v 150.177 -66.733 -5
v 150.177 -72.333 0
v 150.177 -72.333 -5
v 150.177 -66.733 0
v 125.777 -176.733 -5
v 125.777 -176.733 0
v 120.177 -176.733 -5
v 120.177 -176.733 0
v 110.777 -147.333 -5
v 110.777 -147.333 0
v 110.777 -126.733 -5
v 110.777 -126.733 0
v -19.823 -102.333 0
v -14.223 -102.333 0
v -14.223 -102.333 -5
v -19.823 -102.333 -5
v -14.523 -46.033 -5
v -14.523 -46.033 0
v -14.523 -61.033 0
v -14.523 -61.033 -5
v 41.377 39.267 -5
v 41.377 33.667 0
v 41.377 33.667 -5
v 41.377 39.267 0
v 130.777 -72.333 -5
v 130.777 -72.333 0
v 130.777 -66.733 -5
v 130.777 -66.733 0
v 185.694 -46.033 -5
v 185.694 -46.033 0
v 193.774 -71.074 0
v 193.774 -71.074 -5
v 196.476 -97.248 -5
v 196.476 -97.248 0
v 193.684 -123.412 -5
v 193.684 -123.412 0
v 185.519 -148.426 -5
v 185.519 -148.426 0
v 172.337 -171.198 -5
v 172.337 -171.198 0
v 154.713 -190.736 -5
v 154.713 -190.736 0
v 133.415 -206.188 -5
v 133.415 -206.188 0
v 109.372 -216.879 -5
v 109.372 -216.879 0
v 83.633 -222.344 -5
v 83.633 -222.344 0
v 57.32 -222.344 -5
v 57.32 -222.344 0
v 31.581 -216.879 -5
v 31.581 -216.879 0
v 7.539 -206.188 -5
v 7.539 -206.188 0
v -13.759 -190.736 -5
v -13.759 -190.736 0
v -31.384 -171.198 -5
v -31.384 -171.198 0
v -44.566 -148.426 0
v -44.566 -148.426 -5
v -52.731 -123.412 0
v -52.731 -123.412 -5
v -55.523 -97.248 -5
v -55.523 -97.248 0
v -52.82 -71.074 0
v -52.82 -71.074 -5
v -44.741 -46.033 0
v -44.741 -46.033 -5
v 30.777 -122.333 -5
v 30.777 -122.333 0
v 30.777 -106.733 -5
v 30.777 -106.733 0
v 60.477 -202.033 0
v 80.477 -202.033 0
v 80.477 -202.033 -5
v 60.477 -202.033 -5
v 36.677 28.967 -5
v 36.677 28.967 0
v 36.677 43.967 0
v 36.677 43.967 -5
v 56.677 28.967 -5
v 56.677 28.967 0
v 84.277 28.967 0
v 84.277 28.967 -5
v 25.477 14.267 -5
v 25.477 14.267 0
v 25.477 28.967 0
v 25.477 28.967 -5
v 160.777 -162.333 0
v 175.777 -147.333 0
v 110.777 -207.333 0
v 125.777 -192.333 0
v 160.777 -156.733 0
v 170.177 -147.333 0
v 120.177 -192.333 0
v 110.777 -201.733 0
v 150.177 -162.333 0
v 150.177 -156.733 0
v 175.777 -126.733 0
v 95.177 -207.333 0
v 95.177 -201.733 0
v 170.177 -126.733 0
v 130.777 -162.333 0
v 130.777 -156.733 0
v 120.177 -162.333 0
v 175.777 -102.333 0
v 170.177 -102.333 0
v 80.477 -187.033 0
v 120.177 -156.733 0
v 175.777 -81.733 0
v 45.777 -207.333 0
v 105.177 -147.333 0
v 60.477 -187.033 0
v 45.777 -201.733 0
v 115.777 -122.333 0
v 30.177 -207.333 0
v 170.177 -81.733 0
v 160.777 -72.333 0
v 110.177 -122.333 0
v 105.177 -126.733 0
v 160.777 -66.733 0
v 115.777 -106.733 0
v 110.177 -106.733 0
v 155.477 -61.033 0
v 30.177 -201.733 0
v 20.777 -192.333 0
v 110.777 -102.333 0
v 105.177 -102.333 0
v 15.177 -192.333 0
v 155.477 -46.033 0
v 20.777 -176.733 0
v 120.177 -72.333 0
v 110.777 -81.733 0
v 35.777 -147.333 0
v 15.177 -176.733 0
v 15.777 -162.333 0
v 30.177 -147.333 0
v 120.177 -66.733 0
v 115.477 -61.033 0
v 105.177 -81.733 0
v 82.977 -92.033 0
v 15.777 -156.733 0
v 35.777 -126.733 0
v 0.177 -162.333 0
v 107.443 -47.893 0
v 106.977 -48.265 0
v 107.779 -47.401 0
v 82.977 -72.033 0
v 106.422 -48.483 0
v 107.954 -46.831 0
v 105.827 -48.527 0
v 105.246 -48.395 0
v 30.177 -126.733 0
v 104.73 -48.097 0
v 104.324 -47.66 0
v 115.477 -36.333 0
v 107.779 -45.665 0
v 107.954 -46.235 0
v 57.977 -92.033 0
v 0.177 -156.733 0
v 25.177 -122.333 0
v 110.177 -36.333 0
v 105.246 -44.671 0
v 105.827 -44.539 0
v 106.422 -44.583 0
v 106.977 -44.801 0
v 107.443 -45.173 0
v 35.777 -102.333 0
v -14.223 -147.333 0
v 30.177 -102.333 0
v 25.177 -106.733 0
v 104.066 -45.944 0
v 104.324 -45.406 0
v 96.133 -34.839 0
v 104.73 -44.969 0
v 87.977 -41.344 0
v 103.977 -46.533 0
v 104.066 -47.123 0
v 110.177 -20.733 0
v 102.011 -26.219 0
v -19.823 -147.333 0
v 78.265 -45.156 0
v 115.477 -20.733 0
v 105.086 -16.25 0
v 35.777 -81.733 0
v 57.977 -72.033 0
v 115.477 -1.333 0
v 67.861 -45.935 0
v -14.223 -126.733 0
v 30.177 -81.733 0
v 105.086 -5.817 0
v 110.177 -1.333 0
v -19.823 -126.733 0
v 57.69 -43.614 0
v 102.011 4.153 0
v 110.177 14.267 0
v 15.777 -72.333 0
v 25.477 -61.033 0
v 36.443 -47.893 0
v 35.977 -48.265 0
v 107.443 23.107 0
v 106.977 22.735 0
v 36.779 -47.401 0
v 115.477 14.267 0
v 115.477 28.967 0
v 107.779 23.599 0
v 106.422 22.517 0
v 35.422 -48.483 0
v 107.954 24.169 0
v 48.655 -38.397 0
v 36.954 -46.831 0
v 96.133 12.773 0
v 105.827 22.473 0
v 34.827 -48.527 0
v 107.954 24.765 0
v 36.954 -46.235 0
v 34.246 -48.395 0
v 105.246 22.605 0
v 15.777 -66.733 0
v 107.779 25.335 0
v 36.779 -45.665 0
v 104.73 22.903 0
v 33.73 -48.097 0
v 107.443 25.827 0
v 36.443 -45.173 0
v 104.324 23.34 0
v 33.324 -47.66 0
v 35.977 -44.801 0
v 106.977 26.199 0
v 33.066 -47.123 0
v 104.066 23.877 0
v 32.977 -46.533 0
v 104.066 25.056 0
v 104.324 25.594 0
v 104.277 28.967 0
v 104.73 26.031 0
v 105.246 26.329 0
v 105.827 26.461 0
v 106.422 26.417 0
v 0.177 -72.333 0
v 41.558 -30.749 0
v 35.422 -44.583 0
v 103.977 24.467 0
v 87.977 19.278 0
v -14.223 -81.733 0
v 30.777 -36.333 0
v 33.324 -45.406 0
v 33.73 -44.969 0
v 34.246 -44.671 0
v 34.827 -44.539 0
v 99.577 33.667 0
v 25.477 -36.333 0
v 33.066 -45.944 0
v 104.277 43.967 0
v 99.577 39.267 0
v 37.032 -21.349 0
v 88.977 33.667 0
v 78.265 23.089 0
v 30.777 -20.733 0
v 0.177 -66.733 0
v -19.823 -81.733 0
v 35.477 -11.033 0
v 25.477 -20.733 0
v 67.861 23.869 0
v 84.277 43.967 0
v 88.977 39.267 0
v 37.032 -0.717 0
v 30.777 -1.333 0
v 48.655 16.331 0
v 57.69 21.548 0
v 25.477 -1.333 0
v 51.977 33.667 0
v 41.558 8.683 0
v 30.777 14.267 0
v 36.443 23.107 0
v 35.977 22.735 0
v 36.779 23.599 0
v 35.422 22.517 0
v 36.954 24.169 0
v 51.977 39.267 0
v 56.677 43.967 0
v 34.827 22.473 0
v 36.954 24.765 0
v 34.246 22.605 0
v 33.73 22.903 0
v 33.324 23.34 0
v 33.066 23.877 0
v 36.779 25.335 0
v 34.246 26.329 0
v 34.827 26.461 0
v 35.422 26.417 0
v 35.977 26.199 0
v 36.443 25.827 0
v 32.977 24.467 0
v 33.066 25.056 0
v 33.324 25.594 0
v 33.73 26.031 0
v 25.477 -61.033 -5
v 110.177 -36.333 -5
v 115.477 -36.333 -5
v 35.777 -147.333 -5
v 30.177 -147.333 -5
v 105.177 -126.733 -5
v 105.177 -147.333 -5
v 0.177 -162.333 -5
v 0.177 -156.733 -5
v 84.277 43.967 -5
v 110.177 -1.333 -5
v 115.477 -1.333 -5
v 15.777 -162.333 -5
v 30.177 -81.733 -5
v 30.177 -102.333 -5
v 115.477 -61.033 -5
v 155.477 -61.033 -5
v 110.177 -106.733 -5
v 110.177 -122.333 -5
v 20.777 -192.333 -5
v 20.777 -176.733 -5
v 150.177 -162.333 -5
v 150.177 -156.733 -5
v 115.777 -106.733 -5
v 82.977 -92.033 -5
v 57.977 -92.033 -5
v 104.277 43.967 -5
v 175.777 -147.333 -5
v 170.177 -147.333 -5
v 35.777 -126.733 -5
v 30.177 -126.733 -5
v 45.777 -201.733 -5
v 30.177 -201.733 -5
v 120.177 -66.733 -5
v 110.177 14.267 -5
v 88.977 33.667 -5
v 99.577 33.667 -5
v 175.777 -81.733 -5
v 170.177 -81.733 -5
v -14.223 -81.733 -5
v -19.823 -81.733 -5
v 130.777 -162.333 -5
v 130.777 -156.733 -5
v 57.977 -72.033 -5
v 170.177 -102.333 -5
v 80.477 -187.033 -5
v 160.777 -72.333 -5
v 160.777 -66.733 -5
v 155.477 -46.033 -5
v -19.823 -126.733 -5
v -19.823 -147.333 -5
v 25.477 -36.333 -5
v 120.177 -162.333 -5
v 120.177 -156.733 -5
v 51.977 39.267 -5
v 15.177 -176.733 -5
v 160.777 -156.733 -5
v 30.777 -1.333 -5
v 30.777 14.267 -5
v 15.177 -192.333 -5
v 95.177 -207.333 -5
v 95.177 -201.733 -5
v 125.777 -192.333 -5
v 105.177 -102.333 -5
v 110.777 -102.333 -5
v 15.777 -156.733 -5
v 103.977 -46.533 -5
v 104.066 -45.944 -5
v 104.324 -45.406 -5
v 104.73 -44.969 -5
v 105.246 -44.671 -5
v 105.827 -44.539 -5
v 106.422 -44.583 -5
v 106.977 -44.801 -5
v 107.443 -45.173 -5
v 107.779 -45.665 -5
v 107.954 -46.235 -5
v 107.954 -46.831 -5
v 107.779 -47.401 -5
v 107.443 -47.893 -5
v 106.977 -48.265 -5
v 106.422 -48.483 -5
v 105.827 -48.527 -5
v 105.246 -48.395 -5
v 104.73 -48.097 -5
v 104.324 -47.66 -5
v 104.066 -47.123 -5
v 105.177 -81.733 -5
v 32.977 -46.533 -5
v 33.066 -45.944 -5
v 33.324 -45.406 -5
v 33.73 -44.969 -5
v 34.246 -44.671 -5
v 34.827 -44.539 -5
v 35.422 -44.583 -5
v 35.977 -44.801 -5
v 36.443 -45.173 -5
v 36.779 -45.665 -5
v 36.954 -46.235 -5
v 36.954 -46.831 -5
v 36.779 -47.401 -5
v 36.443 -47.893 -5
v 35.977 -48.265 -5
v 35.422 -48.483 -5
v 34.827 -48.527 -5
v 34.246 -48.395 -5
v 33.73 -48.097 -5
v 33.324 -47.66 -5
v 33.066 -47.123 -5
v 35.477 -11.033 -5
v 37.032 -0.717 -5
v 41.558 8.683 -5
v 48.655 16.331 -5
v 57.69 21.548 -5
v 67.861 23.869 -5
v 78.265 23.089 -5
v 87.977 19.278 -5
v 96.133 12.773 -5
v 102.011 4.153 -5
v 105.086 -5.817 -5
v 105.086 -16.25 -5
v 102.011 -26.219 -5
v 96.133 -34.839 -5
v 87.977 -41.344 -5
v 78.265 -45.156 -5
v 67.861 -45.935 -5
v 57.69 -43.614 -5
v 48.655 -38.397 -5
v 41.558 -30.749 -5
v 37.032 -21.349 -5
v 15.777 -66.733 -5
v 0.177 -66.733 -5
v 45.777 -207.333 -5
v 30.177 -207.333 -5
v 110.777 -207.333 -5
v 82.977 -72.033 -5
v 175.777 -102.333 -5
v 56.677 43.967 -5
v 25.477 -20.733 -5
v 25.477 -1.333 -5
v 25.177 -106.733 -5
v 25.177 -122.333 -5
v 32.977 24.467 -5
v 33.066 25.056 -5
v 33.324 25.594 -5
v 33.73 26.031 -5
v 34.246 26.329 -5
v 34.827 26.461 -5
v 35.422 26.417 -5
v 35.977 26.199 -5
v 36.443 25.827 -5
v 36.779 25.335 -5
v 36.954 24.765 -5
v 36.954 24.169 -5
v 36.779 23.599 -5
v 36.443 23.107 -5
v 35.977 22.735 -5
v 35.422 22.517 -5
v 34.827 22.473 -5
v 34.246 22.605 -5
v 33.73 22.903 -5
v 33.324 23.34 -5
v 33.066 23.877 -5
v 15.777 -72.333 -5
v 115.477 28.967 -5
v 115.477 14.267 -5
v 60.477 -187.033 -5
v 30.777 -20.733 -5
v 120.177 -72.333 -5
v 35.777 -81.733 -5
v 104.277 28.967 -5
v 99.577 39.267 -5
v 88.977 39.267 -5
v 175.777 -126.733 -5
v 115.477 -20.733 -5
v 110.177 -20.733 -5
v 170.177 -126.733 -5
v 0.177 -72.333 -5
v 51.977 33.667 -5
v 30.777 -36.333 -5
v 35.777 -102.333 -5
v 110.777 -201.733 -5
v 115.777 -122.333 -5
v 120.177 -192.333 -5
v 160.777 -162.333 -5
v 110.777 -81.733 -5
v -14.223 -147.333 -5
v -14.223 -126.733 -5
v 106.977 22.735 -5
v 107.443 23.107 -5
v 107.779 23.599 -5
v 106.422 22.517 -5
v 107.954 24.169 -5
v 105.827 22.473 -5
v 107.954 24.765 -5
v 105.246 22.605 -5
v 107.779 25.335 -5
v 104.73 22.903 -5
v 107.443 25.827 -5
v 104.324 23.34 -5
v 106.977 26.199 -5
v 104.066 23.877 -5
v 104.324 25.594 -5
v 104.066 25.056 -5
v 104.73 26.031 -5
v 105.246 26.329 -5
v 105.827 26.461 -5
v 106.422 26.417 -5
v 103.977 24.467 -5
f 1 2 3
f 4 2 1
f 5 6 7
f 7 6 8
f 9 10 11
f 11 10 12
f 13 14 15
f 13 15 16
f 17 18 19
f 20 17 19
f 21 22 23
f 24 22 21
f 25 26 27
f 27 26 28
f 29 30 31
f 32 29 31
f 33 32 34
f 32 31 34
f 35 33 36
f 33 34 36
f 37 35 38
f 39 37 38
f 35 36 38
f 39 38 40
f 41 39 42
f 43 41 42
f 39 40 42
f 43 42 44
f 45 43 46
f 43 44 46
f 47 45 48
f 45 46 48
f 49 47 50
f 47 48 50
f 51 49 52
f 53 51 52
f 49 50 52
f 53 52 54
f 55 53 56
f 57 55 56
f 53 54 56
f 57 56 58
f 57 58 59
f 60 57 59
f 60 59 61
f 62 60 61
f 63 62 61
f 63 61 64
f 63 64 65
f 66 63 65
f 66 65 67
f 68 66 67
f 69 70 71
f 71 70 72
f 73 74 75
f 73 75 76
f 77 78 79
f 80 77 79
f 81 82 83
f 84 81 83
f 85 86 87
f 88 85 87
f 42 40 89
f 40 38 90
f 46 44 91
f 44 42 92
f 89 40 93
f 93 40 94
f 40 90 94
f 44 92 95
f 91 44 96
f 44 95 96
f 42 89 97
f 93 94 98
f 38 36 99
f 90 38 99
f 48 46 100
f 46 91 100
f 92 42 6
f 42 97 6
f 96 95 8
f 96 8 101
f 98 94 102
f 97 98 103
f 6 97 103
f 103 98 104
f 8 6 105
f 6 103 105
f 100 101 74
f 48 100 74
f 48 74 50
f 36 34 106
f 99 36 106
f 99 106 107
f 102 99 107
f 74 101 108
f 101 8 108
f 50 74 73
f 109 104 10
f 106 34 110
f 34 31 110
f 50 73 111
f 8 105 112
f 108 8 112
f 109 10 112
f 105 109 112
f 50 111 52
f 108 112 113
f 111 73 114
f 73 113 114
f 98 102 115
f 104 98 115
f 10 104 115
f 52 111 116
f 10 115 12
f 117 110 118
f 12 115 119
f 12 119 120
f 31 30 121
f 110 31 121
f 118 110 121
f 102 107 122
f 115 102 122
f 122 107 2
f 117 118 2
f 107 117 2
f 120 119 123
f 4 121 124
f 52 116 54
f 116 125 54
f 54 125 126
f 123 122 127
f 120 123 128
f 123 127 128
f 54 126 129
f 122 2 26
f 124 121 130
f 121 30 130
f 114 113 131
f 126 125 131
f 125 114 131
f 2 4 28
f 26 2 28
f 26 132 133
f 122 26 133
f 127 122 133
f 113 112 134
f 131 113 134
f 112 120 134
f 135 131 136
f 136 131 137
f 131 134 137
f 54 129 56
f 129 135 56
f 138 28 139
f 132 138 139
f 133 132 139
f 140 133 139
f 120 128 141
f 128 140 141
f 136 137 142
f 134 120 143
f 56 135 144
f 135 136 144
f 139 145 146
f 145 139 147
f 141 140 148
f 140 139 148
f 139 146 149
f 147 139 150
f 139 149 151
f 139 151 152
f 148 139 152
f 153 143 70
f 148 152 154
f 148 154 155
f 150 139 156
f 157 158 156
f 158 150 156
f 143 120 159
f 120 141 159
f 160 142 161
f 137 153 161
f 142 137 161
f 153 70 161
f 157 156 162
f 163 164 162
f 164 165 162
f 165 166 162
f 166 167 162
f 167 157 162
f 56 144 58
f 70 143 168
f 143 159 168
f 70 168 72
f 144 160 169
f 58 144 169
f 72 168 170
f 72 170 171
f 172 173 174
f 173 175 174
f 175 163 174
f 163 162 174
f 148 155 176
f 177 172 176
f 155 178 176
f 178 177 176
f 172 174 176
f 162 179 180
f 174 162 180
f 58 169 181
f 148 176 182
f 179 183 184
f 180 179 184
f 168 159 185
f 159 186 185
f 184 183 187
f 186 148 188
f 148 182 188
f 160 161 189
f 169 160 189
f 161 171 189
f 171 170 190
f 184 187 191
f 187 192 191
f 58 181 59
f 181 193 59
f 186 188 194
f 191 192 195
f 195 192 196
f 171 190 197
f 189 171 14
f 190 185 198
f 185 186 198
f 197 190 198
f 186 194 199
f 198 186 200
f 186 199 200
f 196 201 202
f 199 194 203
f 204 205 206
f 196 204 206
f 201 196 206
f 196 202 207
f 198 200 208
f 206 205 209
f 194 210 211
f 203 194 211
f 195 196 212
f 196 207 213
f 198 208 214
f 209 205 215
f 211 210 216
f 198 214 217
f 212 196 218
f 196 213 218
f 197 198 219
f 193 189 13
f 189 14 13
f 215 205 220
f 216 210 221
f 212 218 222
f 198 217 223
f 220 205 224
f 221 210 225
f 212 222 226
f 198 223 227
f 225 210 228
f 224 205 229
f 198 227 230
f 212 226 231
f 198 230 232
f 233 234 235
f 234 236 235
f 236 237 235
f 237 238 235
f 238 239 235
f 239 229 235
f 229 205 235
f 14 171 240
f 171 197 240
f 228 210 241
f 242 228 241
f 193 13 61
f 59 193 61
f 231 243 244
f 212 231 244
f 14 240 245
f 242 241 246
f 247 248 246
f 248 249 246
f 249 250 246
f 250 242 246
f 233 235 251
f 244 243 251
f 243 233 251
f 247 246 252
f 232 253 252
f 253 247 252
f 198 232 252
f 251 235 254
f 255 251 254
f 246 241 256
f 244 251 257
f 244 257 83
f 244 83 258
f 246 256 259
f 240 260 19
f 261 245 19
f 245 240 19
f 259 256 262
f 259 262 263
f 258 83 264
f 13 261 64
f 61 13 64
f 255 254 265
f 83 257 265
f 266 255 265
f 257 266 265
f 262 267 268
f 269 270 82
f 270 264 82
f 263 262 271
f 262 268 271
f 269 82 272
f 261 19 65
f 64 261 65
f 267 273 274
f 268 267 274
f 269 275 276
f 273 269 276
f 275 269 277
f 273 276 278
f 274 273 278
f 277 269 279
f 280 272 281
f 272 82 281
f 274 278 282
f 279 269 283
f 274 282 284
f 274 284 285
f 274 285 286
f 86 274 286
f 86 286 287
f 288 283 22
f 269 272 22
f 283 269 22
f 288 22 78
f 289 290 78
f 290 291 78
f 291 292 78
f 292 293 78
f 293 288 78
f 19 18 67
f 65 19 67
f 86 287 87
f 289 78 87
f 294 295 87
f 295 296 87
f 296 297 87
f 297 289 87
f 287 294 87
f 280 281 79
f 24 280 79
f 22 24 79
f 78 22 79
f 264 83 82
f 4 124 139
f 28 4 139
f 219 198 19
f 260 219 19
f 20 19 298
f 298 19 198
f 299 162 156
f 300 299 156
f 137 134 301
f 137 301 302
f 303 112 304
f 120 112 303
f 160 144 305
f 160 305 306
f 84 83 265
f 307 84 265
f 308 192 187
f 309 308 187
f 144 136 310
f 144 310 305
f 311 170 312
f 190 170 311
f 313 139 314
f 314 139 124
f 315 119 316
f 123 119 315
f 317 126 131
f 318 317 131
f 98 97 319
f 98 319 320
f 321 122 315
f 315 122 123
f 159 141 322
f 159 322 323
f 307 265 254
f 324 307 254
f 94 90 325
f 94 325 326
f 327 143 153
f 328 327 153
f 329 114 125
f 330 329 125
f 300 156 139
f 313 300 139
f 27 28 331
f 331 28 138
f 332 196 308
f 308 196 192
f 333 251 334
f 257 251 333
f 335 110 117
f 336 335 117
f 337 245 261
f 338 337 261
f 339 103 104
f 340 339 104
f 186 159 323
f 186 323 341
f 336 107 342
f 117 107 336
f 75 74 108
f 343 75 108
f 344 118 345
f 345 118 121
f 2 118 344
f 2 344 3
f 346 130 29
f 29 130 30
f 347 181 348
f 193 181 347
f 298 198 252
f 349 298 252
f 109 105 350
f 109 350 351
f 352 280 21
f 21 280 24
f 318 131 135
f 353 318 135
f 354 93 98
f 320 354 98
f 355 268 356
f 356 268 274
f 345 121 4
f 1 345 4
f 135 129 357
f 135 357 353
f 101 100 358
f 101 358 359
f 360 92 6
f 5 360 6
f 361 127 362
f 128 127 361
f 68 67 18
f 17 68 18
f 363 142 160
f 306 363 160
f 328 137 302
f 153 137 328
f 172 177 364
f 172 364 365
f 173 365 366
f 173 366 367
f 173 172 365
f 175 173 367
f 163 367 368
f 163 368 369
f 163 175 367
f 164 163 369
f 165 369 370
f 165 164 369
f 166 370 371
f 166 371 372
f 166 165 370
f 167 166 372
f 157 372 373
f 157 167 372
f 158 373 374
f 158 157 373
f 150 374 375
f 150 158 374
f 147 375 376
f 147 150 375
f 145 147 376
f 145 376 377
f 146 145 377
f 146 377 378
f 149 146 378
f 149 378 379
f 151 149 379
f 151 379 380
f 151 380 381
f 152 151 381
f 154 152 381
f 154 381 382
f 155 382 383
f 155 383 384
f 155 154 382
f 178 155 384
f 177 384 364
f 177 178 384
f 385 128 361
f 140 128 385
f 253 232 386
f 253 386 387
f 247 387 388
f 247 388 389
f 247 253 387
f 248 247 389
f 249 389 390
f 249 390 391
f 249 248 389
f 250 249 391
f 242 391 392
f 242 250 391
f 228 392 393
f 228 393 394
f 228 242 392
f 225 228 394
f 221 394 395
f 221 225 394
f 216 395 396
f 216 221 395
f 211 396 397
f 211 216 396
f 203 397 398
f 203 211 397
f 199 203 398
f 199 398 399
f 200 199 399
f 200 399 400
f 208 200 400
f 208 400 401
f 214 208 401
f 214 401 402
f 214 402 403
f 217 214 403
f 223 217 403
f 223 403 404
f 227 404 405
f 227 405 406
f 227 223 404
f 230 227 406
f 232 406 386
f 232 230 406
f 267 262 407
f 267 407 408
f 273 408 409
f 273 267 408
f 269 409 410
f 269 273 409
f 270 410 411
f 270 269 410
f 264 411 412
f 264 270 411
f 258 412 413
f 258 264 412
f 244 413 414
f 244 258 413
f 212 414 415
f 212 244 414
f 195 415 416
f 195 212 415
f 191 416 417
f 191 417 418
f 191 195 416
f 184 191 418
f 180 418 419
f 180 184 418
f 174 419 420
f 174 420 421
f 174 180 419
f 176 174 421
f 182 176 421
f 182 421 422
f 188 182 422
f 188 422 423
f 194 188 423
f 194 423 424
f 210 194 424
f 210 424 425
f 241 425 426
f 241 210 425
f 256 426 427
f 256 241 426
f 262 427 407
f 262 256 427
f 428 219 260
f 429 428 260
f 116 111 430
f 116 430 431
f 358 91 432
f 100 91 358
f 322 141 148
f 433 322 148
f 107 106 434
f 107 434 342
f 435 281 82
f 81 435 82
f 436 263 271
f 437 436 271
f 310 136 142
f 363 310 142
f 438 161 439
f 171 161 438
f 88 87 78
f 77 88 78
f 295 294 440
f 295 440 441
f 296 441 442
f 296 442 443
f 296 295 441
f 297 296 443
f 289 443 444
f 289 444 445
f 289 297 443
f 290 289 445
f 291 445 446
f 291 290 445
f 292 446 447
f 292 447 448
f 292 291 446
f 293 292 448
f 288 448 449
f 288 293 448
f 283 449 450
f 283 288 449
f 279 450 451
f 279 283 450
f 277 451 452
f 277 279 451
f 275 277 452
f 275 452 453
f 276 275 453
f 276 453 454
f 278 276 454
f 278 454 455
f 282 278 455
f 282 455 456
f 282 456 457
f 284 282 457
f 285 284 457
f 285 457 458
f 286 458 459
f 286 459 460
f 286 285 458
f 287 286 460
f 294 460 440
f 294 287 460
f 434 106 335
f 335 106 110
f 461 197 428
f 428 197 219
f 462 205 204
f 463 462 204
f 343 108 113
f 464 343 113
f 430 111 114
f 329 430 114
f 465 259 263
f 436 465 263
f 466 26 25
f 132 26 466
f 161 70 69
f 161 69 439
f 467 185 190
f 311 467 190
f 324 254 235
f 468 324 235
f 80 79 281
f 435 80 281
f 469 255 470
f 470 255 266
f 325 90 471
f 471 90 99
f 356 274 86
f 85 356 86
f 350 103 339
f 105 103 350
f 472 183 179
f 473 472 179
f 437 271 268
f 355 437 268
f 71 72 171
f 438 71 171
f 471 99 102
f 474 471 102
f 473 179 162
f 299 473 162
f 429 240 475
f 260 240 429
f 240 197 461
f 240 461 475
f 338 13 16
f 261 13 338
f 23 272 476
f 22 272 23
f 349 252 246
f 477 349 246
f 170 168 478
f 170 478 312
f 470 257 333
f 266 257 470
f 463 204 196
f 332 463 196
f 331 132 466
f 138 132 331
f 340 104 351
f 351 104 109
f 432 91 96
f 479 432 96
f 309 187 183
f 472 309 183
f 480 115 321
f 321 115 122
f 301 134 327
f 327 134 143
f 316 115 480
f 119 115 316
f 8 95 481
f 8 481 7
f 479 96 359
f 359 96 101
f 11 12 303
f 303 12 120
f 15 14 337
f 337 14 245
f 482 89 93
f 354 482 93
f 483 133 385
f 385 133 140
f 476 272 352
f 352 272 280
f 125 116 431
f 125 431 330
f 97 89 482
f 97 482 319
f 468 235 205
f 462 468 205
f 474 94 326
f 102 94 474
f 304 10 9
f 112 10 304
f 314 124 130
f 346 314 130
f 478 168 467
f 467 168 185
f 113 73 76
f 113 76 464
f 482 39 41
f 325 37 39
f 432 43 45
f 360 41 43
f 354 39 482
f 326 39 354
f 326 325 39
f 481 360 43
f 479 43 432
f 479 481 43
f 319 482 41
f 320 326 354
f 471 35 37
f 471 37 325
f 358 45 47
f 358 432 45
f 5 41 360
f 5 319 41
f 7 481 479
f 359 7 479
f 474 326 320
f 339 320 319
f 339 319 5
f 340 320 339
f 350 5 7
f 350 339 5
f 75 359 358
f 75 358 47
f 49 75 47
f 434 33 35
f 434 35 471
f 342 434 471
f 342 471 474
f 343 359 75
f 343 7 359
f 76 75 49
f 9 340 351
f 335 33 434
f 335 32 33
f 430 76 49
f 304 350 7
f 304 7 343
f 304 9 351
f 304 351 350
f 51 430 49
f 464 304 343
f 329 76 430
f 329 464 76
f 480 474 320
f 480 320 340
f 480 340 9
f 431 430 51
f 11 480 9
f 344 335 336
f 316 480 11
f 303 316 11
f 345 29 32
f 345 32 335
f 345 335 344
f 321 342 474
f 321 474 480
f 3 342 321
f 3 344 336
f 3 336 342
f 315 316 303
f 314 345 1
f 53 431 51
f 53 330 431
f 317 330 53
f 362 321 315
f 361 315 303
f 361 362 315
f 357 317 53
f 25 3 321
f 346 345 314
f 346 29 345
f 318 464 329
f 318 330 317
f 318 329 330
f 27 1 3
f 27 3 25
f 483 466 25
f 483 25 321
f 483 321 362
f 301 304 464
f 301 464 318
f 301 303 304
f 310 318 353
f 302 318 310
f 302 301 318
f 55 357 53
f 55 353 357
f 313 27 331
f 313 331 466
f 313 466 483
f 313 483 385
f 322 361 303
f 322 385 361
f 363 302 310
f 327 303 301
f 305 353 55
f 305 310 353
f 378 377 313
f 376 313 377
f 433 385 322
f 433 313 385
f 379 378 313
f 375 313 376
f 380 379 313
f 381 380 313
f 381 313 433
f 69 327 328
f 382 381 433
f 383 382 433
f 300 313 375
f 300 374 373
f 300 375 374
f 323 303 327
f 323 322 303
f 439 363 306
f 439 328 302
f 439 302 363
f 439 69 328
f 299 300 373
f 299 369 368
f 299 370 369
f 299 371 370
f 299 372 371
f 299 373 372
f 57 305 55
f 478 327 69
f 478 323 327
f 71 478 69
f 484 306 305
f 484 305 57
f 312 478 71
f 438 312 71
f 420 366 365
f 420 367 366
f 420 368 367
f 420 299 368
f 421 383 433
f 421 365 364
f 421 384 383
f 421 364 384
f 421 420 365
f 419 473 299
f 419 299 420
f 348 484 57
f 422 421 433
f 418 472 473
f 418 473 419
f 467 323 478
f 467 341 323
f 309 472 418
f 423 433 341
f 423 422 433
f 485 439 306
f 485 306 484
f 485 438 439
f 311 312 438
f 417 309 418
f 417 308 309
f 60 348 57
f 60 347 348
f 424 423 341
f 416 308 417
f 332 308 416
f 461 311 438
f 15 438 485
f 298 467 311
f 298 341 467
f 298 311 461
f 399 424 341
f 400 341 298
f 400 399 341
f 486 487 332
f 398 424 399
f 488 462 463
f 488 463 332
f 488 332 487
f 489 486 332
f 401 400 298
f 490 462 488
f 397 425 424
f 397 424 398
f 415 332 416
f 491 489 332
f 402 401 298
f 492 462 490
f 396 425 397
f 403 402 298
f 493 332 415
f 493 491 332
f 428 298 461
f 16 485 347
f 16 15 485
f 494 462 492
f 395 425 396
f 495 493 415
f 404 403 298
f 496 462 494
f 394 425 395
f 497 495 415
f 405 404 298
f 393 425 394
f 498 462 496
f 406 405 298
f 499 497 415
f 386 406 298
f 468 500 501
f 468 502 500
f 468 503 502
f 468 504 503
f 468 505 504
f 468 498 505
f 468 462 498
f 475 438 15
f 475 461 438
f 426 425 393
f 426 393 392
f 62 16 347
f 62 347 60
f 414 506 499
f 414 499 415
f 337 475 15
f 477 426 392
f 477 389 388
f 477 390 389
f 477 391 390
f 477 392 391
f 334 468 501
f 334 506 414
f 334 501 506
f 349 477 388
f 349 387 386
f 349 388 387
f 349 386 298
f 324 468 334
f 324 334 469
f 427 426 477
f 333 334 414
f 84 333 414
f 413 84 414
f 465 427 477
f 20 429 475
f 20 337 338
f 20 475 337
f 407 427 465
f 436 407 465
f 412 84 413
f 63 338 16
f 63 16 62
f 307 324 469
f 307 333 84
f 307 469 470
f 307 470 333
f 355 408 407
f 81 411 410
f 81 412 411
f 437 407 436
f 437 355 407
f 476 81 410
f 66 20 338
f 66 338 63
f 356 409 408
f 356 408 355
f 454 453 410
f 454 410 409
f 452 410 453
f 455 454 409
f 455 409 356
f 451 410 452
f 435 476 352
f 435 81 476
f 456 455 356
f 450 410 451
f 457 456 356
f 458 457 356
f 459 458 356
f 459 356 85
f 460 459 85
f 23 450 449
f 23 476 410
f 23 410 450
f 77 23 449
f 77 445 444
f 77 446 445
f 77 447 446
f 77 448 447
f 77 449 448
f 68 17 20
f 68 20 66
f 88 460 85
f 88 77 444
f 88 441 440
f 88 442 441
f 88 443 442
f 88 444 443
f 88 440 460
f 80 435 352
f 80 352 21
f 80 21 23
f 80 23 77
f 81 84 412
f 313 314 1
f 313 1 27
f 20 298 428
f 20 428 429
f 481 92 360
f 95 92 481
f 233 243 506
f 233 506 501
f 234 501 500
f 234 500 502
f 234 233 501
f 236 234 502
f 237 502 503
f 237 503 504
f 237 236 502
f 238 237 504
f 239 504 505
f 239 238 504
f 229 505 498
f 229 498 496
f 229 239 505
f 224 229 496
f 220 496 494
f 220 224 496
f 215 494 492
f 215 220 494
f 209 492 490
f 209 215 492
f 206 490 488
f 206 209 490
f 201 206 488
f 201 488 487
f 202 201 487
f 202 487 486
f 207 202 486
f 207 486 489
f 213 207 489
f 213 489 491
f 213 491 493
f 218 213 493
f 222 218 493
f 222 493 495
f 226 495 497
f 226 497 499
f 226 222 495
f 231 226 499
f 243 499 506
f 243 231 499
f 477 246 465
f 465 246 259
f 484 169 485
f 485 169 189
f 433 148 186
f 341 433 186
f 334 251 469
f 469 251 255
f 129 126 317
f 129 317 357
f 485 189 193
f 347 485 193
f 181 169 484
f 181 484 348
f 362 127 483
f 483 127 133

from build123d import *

# Parameters (mm, degrees)
SKETCH1_R           = 35
SKETCH1_R_2         = 2
SKETCH1_W           = 20
SKETCH1_H           = 15
SKETCH1_W_2         = 25
SKETCH1_H_2         = 20
SKETCH1_W_3         = 10.6
SKETCH1_H_3         = 5.6
SKETCH1_W_4         = 15.6
SKETCH1_W_5         = 5.6
SKETCH1_H_4         = 20.6
SKETCH1_H_5         = 15.6
BOSS_EXTRUDE1_DEPTH = 5


with BuildPart() as part:
    # Sketch1 → Boss-Extrude1 (new body)
    with BuildSketch(Plane(origin=(0, 0, 0), x_dir=(-1, 0, 0), z_dir=(0, 0, -1))):
        with BuildLine():
            Line((-25.476672243, 28.966950724), (-36.676672243, 28.966950724))
            Line((-36.676672243, 28.966950724), (-36.676672243, 43.966950724))
            Line((-36.676672243, 43.966950724), (-56.676672243, 43.966950724))
            Line((-56.676672243, 43.966950724), (-56.676672243, 28.966950724))
            Line((-56.676672243, 28.966950724), (-84.276672243, 28.966950724))
            Line((-84.276672243, 28.966950724), (-84.276672243, 43.966950724))
            Line((-84.276672243, 43.966950724), (-104.276672243, 43.966950724))
            Line((-104.276672243, 43.966950724), (-104.276672243, 28.966950724))
            Line((-104.276672243, 28.966950724), (-115.476672243, 28.966950724))
            Line((-115.476672243, 28.966950724), (-115.476672243, 14.266950724))
            Line((-115.476672243, 14.266950724), (-110.176672243, 14.266950724))
            Line((-110.176672243, 14.266950724), (-110.176672243, -1.333049276))
            Line((-110.176672243, -1.333049276), (-115.476672243, -1.333049276))
            Line((-115.476672243, -1.333049276), (-115.476672243, -20.733049276))
            Line((-115.476672243, -20.733049276), (-110.176672243, -20.733049276))
            Line((-110.176672243, -20.733049276), (-110.176672243, -36.333049276))
            Line((-110.176672243, -36.333049276), (-115.476672243, -36.333049276))
            Line((-115.476672243, -36.333049276), (-115.476672243, -61.033049276))
            Line((-115.476672243, -61.033049276), (-155.476672243, -61.033049276))
            Line((-155.476672243, -61.033049276), (-155.476672243, -46.033049276))
            Line((-155.476672243, -46.033049276), (-185.693858461, -46.033049276))
            ThreePointArc((-185.693858461, -46.033049276), (-70.476672243, -223.033049276), (44.740513975, -46.033049276))
            Line((44.740513975, -46.033049276), (14.523327757, -46.033049276))
            Line((14.523327757, -46.033049276), (14.523327757, -61.033049276))
            Line((14.523327757, -61.033049276), (-25.476672243, -61.033049276))
            Line((-25.476672243, -61.033049276), (-25.476672243, -36.333049276))
            Line((-25.476672243, -36.333049276), (-30.776672243, -36.333049276))
            Line((-30.776672243, -36.333049276), (-30.776672243, -20.733049276))
            Line((-30.776672243, -20.733049276), (-25.476672243, -20.733049276))
            Line((-25.476672243, -20.733049276), (-25.476672243, -1.333049276))
            Line((-25.476672243, -1.333049276), (-30.776672243, -1.333049276))
            Line((-30.776672243, -1.333049276), (-30.776672243, 14.266950724))
            Line((-30.776672243, 14.266950724), (-25.476672243, 14.266950724))
            Line((-25.476672243, 14.266950724), (-25.476672243, 28.966950724))
        make_face()
        with Locations((-70.476672243, -11.033049276)):
            Circle(SKETCH1_R, mode=Mode.SUBTRACT)
        with Locations((-34.976672243, 24.466950724)):
            Circle(SKETCH1_R_2, mode=Mode.SUBTRACT)
        with Locations((-105.976672243, 24.466950724)):
            Circle(SKETCH1_R_2, mode=Mode.SUBTRACT)
        with Locations((-105.976672243, -46.533049276)):
            Circle(SKETCH1_R_2, mode=Mode.SUBTRACT)
        with Locations((-34.976672243, -46.533049276)):
            Circle(SKETCH1_R_2, mode=Mode.SUBTRACT)
        with Locations((-70.476672243, -194.533049276)):
            Rectangle(SKETCH1_W, SKETCH1_H, mode=Mode.SUBTRACT)
        with Locations((-70.476672243, -82.033049276)):
            Rectangle(SKETCH1_W_2, SKETCH1_H_2, mode=Mode.SUBTRACT)
        with Locations((-46.676672243, 36.466950724)):
            Rectangle(SKETCH1_W_3, SKETCH1_H_3, mode=Mode.SUBTRACT)
        with Locations((-94.276672243, 36.466950724)):
            Rectangle(SKETCH1_W_3, SKETCH1_H_3, mode=Mode.SUBTRACT)
        with Locations((-7.976672243, -69.533049276)):
            Rectangle(SKETCH1_W_4, SKETCH1_H_3, mode=Mode.SUBTRACT)
        with Locations((17.023327757, -92.033049276)):
            Rectangle(SKETCH1_W_5, SKETCH1_H_4, mode=Mode.SUBTRACT)
        with Locations((-32.976672243, -92.033049276)):
            Rectangle(SKETCH1_W_5, SKETCH1_H_4, mode=Mode.SUBTRACT)
        with Locations((-27.976672243, -114.533049276)):
            Rectangle(SKETCH1_W_5, SKETCH1_H_5, mode=Mode.SUBTRACT)
        with Locations((17.023327757, -137.033049276)):
            Rectangle(SKETCH1_W_5, SKETCH1_H_4, mode=Mode.SUBTRACT)
        with Locations((-7.976672243, -159.533049276)):
            Rectangle(SKETCH1_W_4, SKETCH1_H_3, mode=Mode.SUBTRACT)
        with Locations((-32.976672243, -137.033049276)):
            Rectangle(SKETCH1_W_5, SKETCH1_H_4, mode=Mode.SUBTRACT)
        with Locations((-17.976672243, -184.533049276)):
            Rectangle(SKETCH1_W_5, SKETCH1_H_5, mode=Mode.SUBTRACT)
        with Locations((-37.976672243, -204.533049276)):
            Rectangle(SKETCH1_W_4, SKETCH1_H_3, mode=Mode.SUBTRACT)
        with Locations((-102.976672243, -204.533049276)):
            Rectangle(SKETCH1_W_4, SKETCH1_H_3, mode=Mode.SUBTRACT)
        with Locations((-122.976672243, -184.533049276)):
            Rectangle(SKETCH1_W_5, SKETCH1_H_5, mode=Mode.SUBTRACT)
        with Locations((-125.476672243, -159.533049276)):
            Rectangle(SKETCH1_W_3, SKETCH1_H_3, mode=Mode.SUBTRACT)
        with Locations((-155.476672243, -159.533049276)):
            Rectangle(SKETCH1_W_3, SKETCH1_H_3, mode=Mode.SUBTRACT)
        with Locations((-107.976672243, -137.033049276)):
            Rectangle(SKETCH1_W_5, SKETCH1_H_4, mode=Mode.SUBTRACT)
        with Locations((-172.976672243, -137.033049276)):
            Rectangle(SKETCH1_W_5, SKETCH1_H_4, mode=Mode.SUBTRACT)
        with Locations((-112.976672243, -114.533049276)):
            Rectangle(SKETCH1_W_5, SKETCH1_H_5, mode=Mode.SUBTRACT)
        with Locations((-107.976672243, -92.033049276)):
            Rectangle(SKETCH1_W_5, SKETCH1_H_4, mode=Mode.SUBTRACT)
        with Locations((-172.976672243, -92.033049276)):
            Rectangle(SKETCH1_W_5, SKETCH1_H_4, mode=Mode.SUBTRACT)
        with Locations((-125.476672243, -69.533049276)):
            Rectangle(SKETCH1_W_3, SKETCH1_H_3, mode=Mode.SUBTRACT)
        with Locations((-155.476672243, -69.533049276)):
            Rectangle(SKETCH1_W_3, SKETCH1_H_3, mode=Mode.SUBTRACT)
    extrude(amount=BOSS_EXTRUDE1_DEPTH)


solid = part.part
